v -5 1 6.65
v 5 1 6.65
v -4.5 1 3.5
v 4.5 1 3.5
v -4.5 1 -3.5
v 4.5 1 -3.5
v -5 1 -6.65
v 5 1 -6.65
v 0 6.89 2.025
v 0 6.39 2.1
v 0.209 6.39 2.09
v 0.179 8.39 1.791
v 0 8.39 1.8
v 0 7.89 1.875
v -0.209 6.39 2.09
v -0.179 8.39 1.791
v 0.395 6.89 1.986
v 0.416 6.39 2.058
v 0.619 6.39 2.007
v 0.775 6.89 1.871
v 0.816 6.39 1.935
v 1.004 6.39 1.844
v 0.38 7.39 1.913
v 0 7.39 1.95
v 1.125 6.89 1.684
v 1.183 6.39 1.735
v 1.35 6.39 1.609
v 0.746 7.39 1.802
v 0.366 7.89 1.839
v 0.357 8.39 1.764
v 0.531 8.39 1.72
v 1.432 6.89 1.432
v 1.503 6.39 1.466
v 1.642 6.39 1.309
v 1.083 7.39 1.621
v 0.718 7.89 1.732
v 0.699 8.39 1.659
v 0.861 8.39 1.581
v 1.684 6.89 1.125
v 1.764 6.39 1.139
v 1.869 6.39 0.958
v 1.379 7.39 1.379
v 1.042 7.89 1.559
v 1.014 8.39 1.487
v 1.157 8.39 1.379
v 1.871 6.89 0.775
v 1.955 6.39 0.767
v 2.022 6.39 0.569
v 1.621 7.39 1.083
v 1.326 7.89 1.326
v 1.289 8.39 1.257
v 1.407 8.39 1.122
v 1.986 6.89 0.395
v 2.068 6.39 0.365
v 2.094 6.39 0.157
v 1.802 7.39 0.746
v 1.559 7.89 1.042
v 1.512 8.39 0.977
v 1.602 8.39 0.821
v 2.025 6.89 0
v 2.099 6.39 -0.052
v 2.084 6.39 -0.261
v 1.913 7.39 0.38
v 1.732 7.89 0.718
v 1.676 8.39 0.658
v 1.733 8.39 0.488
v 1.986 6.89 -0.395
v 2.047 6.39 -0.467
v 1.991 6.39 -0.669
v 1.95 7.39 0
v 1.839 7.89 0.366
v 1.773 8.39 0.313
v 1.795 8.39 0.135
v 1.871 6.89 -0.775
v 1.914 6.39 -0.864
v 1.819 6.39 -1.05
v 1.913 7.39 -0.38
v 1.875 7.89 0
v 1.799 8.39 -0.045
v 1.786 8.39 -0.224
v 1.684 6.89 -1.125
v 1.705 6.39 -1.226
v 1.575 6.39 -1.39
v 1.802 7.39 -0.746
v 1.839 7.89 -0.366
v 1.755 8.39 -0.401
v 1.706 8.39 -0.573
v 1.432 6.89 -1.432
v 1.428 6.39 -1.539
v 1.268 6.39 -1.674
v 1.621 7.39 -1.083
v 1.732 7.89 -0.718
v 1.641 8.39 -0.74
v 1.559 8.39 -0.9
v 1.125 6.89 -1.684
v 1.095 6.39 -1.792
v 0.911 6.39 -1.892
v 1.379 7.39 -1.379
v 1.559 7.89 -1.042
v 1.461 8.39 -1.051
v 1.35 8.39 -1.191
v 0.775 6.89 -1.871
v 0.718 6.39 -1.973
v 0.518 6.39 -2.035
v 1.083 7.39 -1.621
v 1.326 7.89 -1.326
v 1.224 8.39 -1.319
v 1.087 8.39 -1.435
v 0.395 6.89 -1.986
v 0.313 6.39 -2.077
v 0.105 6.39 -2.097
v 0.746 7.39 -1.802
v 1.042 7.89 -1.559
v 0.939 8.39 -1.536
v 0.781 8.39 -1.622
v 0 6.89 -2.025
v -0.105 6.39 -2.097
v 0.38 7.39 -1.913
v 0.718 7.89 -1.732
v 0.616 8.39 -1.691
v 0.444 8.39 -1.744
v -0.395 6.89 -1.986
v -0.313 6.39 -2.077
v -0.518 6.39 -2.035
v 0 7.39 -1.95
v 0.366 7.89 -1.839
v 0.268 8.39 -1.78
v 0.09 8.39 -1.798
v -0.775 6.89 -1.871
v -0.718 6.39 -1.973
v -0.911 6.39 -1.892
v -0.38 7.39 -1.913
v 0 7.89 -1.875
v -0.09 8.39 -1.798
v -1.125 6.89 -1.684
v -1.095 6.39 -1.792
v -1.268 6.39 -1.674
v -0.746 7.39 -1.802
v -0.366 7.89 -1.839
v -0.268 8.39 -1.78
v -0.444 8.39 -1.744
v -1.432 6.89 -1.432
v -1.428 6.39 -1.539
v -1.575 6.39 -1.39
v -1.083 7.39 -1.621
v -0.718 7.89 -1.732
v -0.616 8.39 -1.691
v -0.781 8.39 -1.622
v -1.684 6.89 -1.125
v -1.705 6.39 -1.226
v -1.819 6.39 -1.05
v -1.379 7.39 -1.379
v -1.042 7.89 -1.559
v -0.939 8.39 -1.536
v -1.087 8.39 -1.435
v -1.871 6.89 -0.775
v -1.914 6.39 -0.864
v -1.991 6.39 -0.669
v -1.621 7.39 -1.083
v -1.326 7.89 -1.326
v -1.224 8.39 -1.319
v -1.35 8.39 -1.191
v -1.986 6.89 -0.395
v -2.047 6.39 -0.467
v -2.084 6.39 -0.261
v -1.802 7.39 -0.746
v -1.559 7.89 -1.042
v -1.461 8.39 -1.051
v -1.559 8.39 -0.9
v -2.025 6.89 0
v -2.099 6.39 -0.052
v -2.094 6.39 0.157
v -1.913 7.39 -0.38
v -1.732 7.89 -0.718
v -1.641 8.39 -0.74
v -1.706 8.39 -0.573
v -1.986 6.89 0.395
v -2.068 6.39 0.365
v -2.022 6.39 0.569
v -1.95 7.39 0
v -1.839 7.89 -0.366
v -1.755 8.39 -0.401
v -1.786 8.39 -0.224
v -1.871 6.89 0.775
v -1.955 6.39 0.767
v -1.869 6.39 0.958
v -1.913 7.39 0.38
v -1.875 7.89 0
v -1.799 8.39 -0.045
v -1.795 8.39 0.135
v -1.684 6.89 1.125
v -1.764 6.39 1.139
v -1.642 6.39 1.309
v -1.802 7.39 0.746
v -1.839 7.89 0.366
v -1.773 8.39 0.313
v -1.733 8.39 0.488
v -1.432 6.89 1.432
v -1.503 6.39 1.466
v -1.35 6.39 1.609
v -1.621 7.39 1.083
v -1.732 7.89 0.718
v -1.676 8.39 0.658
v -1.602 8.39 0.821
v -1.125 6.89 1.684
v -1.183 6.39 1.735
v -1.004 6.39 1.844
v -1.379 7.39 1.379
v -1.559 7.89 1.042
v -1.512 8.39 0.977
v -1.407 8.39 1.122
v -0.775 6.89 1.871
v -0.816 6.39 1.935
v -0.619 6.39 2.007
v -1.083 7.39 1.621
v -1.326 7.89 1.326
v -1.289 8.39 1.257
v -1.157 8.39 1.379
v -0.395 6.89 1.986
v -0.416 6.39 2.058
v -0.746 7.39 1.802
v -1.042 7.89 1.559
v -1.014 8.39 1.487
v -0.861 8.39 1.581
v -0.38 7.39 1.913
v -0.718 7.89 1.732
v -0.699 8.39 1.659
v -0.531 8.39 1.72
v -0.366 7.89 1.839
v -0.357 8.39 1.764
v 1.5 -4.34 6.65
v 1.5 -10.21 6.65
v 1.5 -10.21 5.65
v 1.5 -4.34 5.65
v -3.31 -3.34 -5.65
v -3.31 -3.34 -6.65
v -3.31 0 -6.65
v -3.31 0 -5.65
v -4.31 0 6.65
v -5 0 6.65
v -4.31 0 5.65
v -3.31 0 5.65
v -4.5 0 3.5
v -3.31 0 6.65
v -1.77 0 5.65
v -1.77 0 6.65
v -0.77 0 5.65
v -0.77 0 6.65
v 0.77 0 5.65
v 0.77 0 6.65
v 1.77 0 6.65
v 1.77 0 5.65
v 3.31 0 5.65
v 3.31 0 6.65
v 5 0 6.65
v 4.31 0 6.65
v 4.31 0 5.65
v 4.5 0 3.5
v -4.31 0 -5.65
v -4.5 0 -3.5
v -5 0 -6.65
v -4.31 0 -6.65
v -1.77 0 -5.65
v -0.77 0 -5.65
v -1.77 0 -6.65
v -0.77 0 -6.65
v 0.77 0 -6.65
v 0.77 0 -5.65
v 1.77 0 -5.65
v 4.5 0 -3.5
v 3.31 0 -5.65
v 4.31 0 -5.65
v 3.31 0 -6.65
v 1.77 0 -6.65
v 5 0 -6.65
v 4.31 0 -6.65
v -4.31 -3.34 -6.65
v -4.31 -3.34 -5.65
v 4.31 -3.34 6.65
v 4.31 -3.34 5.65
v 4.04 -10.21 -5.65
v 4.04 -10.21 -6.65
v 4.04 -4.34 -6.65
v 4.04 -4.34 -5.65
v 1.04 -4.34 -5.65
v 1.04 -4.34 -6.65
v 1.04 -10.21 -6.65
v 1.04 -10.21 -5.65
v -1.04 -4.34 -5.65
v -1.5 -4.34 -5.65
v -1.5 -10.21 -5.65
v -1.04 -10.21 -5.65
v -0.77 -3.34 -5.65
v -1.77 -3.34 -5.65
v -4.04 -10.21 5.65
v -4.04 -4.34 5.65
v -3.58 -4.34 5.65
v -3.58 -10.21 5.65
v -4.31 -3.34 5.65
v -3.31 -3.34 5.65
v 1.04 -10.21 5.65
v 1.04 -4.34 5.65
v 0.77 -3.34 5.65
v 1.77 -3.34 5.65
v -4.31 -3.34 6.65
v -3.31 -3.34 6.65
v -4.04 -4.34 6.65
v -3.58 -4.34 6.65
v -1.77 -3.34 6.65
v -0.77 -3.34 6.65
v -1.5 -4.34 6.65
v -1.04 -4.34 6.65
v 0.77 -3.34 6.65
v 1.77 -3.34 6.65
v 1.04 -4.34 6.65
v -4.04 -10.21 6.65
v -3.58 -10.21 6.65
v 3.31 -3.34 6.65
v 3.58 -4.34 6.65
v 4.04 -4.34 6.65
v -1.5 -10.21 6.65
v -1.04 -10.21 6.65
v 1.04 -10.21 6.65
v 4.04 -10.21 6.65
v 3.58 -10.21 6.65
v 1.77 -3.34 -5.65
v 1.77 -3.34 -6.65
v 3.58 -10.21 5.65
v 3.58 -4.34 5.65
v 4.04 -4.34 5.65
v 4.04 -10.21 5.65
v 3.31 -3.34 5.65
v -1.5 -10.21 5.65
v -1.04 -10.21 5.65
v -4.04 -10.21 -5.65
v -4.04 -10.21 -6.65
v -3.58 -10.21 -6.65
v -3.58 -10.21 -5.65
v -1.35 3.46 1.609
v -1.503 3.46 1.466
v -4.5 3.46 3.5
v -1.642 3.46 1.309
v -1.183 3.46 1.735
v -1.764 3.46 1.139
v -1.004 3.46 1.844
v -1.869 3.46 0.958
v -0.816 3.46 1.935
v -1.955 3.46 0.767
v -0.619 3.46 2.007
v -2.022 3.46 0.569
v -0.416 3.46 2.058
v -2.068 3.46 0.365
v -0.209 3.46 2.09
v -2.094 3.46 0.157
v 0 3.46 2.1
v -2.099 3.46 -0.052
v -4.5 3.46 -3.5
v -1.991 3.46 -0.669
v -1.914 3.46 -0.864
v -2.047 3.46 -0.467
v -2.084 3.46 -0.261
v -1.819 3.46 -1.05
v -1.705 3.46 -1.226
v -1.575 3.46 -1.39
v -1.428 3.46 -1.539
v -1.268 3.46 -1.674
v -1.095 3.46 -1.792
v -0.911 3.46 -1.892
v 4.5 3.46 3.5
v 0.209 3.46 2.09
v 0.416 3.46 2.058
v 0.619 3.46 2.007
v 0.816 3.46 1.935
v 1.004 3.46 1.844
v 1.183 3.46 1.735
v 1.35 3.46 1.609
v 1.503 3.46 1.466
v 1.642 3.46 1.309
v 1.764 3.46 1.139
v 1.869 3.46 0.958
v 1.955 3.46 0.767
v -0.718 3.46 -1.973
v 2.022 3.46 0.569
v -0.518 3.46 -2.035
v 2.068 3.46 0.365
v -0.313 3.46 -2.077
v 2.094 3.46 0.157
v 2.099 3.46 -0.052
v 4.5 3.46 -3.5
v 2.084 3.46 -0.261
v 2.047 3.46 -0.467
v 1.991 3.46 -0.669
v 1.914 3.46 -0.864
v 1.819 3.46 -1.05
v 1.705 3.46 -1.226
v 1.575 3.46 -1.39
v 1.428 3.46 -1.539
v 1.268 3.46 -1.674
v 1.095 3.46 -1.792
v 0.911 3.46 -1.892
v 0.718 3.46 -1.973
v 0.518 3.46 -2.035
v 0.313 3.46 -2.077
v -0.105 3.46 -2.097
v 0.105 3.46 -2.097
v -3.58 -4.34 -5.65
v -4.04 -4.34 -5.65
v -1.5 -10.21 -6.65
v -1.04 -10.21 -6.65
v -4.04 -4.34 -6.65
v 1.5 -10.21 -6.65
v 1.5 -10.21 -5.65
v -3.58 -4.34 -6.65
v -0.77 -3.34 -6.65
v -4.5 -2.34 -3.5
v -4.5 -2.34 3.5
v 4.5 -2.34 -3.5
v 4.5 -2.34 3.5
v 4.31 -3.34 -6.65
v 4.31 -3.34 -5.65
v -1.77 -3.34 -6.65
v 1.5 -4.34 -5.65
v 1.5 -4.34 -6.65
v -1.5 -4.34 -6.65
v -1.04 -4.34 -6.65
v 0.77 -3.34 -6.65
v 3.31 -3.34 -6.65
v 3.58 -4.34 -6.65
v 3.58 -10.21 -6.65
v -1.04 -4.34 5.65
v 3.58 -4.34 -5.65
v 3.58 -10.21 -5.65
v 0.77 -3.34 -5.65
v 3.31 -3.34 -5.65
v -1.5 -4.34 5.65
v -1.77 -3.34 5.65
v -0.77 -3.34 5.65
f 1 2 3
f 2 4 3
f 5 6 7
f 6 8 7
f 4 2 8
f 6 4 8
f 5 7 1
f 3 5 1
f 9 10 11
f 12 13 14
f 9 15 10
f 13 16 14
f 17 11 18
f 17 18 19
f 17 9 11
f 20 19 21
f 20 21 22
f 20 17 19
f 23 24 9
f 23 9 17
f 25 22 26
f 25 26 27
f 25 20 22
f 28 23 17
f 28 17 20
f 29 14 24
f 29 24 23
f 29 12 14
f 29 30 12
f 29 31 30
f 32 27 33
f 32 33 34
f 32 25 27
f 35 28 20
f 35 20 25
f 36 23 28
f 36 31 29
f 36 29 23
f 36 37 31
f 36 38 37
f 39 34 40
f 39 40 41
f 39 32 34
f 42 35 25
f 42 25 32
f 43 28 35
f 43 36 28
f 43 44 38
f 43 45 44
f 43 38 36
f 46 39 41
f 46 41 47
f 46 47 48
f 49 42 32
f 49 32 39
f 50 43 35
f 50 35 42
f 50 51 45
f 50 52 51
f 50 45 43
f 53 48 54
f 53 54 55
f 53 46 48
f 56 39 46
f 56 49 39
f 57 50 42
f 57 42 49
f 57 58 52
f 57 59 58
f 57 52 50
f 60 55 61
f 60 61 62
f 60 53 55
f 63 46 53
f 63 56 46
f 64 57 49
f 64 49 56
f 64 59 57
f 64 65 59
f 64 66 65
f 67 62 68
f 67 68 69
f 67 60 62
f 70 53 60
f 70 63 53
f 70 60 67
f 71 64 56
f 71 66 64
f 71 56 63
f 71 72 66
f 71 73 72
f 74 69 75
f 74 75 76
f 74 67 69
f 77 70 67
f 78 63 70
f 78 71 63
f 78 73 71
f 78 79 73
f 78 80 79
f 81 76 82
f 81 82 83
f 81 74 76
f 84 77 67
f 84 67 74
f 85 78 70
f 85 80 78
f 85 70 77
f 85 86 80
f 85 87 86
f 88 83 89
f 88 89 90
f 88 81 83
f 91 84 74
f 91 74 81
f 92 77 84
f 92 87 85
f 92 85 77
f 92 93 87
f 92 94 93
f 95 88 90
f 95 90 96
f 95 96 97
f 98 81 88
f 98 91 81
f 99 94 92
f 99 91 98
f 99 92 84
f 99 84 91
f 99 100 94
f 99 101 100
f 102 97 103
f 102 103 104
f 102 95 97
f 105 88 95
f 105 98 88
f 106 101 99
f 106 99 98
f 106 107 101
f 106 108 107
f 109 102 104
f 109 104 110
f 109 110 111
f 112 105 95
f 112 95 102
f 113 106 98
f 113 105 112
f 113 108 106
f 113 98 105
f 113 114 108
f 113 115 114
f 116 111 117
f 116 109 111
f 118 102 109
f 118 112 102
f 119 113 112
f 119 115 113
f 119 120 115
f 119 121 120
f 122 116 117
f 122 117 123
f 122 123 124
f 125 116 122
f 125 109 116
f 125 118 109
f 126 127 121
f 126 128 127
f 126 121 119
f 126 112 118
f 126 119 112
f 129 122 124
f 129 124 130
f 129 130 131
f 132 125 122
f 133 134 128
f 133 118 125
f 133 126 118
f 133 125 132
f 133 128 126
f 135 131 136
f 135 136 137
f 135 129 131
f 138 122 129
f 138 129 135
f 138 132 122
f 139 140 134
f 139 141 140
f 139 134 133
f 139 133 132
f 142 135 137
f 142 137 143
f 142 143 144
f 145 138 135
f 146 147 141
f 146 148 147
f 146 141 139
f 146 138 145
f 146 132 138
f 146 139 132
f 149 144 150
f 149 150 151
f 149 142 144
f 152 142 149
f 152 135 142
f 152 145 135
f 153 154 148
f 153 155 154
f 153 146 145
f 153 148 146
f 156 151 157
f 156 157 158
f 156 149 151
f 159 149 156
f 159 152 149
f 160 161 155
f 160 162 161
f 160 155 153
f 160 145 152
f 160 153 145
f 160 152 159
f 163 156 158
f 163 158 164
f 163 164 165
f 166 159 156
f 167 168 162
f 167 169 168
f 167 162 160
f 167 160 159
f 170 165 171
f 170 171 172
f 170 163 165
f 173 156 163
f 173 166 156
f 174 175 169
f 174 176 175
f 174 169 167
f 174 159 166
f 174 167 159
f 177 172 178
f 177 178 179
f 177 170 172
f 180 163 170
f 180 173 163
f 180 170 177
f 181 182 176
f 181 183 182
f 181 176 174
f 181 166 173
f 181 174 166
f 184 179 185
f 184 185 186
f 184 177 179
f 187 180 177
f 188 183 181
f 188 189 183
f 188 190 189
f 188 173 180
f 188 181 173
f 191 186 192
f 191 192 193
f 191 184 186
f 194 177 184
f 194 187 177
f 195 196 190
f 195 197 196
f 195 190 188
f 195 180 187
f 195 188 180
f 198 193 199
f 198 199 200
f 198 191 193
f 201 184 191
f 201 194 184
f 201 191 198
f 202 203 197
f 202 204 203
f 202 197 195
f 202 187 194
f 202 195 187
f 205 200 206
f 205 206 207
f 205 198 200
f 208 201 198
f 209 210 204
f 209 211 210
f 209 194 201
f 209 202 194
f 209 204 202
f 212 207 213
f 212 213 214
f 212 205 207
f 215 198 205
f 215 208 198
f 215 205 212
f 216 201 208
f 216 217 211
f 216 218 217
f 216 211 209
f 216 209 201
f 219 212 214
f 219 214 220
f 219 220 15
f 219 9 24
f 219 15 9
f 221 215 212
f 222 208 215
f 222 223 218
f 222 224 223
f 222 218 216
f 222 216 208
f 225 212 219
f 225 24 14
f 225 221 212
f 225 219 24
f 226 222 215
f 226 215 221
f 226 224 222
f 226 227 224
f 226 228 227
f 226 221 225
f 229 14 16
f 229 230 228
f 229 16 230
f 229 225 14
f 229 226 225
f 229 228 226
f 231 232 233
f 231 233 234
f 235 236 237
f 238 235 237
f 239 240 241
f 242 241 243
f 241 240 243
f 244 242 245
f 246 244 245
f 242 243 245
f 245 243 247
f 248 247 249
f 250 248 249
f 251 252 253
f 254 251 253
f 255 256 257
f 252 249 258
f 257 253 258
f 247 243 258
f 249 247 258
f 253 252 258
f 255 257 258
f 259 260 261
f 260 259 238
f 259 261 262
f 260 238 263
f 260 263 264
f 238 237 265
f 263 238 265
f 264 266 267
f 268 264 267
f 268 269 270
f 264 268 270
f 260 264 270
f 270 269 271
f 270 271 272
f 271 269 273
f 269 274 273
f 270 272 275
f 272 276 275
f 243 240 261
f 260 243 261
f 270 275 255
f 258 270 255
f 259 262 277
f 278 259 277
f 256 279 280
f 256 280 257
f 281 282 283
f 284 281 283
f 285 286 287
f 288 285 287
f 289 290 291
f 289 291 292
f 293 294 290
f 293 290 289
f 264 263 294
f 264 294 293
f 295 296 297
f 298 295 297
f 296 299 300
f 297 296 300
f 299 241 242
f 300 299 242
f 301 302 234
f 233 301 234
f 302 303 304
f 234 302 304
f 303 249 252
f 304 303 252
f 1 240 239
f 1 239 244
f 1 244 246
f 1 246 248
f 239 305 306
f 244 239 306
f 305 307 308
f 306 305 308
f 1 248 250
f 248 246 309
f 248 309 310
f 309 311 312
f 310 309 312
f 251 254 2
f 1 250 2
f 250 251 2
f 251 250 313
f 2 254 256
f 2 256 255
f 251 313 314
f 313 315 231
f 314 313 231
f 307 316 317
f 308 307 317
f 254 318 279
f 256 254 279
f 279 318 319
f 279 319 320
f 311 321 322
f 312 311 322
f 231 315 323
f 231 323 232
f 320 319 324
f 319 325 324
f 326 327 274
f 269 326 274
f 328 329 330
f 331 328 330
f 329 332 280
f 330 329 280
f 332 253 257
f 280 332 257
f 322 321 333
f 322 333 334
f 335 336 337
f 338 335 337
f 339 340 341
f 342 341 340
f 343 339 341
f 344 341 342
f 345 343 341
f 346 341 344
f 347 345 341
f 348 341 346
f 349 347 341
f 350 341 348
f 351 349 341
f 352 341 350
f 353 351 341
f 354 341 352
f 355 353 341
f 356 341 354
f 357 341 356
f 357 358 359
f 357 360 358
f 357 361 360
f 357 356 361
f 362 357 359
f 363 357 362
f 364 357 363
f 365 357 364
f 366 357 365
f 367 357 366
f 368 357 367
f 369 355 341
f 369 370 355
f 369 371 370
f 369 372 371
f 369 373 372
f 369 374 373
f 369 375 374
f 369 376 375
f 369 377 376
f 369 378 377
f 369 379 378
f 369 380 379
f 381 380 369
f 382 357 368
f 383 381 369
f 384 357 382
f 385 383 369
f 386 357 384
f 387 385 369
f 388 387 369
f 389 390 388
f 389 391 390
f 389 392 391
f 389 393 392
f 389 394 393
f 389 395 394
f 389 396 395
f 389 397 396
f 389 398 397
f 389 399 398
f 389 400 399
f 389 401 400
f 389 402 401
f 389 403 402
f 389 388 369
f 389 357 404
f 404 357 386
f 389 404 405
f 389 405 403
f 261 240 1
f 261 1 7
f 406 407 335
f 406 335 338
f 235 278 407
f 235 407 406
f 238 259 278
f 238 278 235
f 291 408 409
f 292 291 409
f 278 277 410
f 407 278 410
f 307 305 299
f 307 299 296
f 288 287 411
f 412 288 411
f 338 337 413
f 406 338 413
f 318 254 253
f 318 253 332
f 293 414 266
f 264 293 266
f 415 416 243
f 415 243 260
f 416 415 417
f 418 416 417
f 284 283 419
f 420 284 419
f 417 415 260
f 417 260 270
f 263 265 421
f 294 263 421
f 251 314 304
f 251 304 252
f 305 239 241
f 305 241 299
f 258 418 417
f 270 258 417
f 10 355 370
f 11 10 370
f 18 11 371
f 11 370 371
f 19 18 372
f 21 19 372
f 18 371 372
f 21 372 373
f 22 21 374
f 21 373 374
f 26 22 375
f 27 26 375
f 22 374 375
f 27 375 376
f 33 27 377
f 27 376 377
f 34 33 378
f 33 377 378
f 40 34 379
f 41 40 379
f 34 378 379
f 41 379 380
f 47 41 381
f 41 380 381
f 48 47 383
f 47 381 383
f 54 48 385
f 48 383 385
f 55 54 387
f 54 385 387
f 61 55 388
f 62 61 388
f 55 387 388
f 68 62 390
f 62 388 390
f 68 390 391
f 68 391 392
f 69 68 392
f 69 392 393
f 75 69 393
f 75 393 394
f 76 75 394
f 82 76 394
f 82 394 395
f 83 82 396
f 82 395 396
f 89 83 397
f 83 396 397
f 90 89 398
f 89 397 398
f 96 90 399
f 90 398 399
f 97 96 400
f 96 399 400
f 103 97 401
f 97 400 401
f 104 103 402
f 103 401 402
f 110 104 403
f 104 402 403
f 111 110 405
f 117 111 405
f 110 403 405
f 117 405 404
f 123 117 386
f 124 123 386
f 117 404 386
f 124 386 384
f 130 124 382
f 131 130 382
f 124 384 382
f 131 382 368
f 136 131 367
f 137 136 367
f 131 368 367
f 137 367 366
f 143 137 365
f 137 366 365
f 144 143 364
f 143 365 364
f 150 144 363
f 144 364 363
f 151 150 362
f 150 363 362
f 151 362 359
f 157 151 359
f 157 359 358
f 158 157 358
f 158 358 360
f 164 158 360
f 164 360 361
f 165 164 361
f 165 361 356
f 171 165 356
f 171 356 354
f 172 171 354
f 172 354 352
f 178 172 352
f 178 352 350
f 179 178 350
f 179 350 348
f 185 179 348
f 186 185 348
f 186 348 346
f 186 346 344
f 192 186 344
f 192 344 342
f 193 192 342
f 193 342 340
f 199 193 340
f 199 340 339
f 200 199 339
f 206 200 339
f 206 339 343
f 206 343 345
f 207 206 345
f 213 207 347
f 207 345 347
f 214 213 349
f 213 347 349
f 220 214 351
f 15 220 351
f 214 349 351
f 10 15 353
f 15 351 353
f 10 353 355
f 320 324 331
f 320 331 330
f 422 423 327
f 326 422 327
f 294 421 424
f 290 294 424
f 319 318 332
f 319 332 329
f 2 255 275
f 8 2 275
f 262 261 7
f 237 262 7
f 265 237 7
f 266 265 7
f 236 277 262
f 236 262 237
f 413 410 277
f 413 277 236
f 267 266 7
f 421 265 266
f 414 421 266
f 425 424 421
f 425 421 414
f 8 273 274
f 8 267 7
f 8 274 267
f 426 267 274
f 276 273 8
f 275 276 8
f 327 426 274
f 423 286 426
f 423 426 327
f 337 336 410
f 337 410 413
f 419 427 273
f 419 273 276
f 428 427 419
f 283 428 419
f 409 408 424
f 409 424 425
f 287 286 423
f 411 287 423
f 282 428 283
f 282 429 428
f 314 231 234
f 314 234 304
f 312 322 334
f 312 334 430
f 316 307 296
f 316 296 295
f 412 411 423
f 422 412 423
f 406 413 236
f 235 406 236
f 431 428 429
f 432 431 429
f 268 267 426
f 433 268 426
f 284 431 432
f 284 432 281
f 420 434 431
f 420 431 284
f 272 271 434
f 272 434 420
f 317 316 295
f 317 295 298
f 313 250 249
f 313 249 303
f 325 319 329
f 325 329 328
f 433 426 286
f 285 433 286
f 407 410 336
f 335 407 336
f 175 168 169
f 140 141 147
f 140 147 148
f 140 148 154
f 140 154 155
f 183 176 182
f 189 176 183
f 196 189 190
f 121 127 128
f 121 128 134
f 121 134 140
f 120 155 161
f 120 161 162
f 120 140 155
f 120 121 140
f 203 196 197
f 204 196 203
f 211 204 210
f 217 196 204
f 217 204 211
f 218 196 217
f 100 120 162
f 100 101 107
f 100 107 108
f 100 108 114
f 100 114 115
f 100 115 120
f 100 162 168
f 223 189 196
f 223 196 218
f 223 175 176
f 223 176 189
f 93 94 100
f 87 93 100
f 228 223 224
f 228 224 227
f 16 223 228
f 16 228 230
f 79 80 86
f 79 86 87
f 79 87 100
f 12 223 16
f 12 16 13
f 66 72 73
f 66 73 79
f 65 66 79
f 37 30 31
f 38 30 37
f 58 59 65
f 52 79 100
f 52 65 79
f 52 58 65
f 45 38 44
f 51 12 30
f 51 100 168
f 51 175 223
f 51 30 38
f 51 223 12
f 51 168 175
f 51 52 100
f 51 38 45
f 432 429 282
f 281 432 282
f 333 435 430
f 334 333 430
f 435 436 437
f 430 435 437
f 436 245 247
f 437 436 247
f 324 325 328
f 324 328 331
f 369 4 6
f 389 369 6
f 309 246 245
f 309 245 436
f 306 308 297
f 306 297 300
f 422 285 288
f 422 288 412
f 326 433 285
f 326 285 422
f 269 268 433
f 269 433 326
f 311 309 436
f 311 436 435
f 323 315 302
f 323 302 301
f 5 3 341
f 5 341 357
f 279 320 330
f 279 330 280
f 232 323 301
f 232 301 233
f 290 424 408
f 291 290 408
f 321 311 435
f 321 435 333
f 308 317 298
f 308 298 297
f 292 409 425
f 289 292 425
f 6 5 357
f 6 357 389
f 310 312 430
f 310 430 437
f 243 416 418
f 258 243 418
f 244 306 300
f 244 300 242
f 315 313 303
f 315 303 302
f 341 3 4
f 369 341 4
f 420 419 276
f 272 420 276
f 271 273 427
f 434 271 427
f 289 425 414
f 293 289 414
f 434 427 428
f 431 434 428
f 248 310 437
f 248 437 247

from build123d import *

# Parameters (mm, degrees)
SKETCH1_W                = 10
SKETCH1_H                = 13.3
BOSS_EXTRUDE1_DEPTH      = 1
BOSS_EXTRUDE2_DEPTH      = 2.46
BOSS_EXTRUDE2_DEPTH_BACK = 3.34
SKETCH2_W                = 9
SKETCH2_H                = 7
SKETCH3_R                = 2.1
BOSS_EXTRUDE3_DEPTH      = 4.93
CHAMFER1_SIZE            = 2
CHAMFER1_SIZE2           = 0.3
BOSS_EXTRUDE4_DEPTH      = 1


with BuildPart() as part:
    # Sketch1 → Boss-Extrude1 (new body)
    with BuildSketch(Plane(origin=(0, 0, 0), x_dir=(1, 0, 0), z_dir=(0, 1, 0))):
        Rectangle(SKETCH1_W, SKETCH1_H)
    extrude(amount=BOSS_EXTRUDE1_DEPTH)

    # Sketch2 → Boss-Extrude2 (add, two sides: drawn at the far end of the back side and taken through both)
    with BuildSketch(Plane(origin=(0, 1, 0), x_dir=(1, 0, 0), z_dir=(0, 1, 0)).offset(-BOSS_EXTRUDE2_DEPTH_BACK)):
        Rectangle(SKETCH2_W, SKETCH2_H)
    extrude(amount=BOSS_EXTRUDE2_DEPTH + BOSS_EXTRUDE2_DEPTH_BACK)

    # Sketch3 → Boss-Extrude3 (add)
    with BuildSketch(Plane(origin=(0, 3.46, 0), x_dir=(1, 0, 0), z_dir=(0, 1, 0))):
        with Locations(Location((0, 0, 0), (0, 0, 270))):
            Circle(SKETCH3_R)
    extrude(amount=BOSS_EXTRUDE3_DEPTH)

    # Chamfer1
    chamfer1_edges = [part.edges().sort_by_distance(p)[0] for p in [
        (0, 8.39, -2.1),
    ]]
    chamfer1_side = [part.faces().sort_by_distance(p)[0] for p in [
        (0, 5.925, -2.1),
    ]]
    chamfer(chamfer1_edges, length=CHAMFER1_SIZE, length2=CHAMFER1_SIZE2, reference=chamfer1_side[0])

    # Sketch5 → Boss-Extrude4 (add)
    with BuildSketch(Plane.XY.offset(6.65)):
        Polygon((-4.31, 1), (-4.31, -3.34), (-4.04, -4.34), (-4.04, -10.21), (-3.58, -10.21), (-3.58, -4.34), (-3.31, -3.34), (-3.31, 1), align=None)
        Polygon((-1.77, 1), (-1.77, -3.34), (-1.5, -4.34), (-1.5, -10.21), (-1.04, -10.21), (-1.04, -4.34), (-0.77, -3.34), (-0.77, 1), align=None)
        Polygon((0.77, 1), (0.77, -3.34), (1.04, -4.34), (1.04, -10.21), (1.5, -10.21), (1.5, -4.34), (1.77, -3.34), (1.77, 1), align=None)
        Polygon((3.31, 1), (3.31, -3.34), (3.58, -4.34), (3.58, -10.21), (4.04, -10.21), (4.04, -4.34), (4.31, -3.34), (4.31, 1), align=None)
    boss_extrude4 = extrude(amount=-BOSS_EXTRUDE4_DEPTH)

    # Mirror1: Boss-Extrude4 across plane
    add(boss_extrude4.mirror(Plane.XY))


solid = part.part
